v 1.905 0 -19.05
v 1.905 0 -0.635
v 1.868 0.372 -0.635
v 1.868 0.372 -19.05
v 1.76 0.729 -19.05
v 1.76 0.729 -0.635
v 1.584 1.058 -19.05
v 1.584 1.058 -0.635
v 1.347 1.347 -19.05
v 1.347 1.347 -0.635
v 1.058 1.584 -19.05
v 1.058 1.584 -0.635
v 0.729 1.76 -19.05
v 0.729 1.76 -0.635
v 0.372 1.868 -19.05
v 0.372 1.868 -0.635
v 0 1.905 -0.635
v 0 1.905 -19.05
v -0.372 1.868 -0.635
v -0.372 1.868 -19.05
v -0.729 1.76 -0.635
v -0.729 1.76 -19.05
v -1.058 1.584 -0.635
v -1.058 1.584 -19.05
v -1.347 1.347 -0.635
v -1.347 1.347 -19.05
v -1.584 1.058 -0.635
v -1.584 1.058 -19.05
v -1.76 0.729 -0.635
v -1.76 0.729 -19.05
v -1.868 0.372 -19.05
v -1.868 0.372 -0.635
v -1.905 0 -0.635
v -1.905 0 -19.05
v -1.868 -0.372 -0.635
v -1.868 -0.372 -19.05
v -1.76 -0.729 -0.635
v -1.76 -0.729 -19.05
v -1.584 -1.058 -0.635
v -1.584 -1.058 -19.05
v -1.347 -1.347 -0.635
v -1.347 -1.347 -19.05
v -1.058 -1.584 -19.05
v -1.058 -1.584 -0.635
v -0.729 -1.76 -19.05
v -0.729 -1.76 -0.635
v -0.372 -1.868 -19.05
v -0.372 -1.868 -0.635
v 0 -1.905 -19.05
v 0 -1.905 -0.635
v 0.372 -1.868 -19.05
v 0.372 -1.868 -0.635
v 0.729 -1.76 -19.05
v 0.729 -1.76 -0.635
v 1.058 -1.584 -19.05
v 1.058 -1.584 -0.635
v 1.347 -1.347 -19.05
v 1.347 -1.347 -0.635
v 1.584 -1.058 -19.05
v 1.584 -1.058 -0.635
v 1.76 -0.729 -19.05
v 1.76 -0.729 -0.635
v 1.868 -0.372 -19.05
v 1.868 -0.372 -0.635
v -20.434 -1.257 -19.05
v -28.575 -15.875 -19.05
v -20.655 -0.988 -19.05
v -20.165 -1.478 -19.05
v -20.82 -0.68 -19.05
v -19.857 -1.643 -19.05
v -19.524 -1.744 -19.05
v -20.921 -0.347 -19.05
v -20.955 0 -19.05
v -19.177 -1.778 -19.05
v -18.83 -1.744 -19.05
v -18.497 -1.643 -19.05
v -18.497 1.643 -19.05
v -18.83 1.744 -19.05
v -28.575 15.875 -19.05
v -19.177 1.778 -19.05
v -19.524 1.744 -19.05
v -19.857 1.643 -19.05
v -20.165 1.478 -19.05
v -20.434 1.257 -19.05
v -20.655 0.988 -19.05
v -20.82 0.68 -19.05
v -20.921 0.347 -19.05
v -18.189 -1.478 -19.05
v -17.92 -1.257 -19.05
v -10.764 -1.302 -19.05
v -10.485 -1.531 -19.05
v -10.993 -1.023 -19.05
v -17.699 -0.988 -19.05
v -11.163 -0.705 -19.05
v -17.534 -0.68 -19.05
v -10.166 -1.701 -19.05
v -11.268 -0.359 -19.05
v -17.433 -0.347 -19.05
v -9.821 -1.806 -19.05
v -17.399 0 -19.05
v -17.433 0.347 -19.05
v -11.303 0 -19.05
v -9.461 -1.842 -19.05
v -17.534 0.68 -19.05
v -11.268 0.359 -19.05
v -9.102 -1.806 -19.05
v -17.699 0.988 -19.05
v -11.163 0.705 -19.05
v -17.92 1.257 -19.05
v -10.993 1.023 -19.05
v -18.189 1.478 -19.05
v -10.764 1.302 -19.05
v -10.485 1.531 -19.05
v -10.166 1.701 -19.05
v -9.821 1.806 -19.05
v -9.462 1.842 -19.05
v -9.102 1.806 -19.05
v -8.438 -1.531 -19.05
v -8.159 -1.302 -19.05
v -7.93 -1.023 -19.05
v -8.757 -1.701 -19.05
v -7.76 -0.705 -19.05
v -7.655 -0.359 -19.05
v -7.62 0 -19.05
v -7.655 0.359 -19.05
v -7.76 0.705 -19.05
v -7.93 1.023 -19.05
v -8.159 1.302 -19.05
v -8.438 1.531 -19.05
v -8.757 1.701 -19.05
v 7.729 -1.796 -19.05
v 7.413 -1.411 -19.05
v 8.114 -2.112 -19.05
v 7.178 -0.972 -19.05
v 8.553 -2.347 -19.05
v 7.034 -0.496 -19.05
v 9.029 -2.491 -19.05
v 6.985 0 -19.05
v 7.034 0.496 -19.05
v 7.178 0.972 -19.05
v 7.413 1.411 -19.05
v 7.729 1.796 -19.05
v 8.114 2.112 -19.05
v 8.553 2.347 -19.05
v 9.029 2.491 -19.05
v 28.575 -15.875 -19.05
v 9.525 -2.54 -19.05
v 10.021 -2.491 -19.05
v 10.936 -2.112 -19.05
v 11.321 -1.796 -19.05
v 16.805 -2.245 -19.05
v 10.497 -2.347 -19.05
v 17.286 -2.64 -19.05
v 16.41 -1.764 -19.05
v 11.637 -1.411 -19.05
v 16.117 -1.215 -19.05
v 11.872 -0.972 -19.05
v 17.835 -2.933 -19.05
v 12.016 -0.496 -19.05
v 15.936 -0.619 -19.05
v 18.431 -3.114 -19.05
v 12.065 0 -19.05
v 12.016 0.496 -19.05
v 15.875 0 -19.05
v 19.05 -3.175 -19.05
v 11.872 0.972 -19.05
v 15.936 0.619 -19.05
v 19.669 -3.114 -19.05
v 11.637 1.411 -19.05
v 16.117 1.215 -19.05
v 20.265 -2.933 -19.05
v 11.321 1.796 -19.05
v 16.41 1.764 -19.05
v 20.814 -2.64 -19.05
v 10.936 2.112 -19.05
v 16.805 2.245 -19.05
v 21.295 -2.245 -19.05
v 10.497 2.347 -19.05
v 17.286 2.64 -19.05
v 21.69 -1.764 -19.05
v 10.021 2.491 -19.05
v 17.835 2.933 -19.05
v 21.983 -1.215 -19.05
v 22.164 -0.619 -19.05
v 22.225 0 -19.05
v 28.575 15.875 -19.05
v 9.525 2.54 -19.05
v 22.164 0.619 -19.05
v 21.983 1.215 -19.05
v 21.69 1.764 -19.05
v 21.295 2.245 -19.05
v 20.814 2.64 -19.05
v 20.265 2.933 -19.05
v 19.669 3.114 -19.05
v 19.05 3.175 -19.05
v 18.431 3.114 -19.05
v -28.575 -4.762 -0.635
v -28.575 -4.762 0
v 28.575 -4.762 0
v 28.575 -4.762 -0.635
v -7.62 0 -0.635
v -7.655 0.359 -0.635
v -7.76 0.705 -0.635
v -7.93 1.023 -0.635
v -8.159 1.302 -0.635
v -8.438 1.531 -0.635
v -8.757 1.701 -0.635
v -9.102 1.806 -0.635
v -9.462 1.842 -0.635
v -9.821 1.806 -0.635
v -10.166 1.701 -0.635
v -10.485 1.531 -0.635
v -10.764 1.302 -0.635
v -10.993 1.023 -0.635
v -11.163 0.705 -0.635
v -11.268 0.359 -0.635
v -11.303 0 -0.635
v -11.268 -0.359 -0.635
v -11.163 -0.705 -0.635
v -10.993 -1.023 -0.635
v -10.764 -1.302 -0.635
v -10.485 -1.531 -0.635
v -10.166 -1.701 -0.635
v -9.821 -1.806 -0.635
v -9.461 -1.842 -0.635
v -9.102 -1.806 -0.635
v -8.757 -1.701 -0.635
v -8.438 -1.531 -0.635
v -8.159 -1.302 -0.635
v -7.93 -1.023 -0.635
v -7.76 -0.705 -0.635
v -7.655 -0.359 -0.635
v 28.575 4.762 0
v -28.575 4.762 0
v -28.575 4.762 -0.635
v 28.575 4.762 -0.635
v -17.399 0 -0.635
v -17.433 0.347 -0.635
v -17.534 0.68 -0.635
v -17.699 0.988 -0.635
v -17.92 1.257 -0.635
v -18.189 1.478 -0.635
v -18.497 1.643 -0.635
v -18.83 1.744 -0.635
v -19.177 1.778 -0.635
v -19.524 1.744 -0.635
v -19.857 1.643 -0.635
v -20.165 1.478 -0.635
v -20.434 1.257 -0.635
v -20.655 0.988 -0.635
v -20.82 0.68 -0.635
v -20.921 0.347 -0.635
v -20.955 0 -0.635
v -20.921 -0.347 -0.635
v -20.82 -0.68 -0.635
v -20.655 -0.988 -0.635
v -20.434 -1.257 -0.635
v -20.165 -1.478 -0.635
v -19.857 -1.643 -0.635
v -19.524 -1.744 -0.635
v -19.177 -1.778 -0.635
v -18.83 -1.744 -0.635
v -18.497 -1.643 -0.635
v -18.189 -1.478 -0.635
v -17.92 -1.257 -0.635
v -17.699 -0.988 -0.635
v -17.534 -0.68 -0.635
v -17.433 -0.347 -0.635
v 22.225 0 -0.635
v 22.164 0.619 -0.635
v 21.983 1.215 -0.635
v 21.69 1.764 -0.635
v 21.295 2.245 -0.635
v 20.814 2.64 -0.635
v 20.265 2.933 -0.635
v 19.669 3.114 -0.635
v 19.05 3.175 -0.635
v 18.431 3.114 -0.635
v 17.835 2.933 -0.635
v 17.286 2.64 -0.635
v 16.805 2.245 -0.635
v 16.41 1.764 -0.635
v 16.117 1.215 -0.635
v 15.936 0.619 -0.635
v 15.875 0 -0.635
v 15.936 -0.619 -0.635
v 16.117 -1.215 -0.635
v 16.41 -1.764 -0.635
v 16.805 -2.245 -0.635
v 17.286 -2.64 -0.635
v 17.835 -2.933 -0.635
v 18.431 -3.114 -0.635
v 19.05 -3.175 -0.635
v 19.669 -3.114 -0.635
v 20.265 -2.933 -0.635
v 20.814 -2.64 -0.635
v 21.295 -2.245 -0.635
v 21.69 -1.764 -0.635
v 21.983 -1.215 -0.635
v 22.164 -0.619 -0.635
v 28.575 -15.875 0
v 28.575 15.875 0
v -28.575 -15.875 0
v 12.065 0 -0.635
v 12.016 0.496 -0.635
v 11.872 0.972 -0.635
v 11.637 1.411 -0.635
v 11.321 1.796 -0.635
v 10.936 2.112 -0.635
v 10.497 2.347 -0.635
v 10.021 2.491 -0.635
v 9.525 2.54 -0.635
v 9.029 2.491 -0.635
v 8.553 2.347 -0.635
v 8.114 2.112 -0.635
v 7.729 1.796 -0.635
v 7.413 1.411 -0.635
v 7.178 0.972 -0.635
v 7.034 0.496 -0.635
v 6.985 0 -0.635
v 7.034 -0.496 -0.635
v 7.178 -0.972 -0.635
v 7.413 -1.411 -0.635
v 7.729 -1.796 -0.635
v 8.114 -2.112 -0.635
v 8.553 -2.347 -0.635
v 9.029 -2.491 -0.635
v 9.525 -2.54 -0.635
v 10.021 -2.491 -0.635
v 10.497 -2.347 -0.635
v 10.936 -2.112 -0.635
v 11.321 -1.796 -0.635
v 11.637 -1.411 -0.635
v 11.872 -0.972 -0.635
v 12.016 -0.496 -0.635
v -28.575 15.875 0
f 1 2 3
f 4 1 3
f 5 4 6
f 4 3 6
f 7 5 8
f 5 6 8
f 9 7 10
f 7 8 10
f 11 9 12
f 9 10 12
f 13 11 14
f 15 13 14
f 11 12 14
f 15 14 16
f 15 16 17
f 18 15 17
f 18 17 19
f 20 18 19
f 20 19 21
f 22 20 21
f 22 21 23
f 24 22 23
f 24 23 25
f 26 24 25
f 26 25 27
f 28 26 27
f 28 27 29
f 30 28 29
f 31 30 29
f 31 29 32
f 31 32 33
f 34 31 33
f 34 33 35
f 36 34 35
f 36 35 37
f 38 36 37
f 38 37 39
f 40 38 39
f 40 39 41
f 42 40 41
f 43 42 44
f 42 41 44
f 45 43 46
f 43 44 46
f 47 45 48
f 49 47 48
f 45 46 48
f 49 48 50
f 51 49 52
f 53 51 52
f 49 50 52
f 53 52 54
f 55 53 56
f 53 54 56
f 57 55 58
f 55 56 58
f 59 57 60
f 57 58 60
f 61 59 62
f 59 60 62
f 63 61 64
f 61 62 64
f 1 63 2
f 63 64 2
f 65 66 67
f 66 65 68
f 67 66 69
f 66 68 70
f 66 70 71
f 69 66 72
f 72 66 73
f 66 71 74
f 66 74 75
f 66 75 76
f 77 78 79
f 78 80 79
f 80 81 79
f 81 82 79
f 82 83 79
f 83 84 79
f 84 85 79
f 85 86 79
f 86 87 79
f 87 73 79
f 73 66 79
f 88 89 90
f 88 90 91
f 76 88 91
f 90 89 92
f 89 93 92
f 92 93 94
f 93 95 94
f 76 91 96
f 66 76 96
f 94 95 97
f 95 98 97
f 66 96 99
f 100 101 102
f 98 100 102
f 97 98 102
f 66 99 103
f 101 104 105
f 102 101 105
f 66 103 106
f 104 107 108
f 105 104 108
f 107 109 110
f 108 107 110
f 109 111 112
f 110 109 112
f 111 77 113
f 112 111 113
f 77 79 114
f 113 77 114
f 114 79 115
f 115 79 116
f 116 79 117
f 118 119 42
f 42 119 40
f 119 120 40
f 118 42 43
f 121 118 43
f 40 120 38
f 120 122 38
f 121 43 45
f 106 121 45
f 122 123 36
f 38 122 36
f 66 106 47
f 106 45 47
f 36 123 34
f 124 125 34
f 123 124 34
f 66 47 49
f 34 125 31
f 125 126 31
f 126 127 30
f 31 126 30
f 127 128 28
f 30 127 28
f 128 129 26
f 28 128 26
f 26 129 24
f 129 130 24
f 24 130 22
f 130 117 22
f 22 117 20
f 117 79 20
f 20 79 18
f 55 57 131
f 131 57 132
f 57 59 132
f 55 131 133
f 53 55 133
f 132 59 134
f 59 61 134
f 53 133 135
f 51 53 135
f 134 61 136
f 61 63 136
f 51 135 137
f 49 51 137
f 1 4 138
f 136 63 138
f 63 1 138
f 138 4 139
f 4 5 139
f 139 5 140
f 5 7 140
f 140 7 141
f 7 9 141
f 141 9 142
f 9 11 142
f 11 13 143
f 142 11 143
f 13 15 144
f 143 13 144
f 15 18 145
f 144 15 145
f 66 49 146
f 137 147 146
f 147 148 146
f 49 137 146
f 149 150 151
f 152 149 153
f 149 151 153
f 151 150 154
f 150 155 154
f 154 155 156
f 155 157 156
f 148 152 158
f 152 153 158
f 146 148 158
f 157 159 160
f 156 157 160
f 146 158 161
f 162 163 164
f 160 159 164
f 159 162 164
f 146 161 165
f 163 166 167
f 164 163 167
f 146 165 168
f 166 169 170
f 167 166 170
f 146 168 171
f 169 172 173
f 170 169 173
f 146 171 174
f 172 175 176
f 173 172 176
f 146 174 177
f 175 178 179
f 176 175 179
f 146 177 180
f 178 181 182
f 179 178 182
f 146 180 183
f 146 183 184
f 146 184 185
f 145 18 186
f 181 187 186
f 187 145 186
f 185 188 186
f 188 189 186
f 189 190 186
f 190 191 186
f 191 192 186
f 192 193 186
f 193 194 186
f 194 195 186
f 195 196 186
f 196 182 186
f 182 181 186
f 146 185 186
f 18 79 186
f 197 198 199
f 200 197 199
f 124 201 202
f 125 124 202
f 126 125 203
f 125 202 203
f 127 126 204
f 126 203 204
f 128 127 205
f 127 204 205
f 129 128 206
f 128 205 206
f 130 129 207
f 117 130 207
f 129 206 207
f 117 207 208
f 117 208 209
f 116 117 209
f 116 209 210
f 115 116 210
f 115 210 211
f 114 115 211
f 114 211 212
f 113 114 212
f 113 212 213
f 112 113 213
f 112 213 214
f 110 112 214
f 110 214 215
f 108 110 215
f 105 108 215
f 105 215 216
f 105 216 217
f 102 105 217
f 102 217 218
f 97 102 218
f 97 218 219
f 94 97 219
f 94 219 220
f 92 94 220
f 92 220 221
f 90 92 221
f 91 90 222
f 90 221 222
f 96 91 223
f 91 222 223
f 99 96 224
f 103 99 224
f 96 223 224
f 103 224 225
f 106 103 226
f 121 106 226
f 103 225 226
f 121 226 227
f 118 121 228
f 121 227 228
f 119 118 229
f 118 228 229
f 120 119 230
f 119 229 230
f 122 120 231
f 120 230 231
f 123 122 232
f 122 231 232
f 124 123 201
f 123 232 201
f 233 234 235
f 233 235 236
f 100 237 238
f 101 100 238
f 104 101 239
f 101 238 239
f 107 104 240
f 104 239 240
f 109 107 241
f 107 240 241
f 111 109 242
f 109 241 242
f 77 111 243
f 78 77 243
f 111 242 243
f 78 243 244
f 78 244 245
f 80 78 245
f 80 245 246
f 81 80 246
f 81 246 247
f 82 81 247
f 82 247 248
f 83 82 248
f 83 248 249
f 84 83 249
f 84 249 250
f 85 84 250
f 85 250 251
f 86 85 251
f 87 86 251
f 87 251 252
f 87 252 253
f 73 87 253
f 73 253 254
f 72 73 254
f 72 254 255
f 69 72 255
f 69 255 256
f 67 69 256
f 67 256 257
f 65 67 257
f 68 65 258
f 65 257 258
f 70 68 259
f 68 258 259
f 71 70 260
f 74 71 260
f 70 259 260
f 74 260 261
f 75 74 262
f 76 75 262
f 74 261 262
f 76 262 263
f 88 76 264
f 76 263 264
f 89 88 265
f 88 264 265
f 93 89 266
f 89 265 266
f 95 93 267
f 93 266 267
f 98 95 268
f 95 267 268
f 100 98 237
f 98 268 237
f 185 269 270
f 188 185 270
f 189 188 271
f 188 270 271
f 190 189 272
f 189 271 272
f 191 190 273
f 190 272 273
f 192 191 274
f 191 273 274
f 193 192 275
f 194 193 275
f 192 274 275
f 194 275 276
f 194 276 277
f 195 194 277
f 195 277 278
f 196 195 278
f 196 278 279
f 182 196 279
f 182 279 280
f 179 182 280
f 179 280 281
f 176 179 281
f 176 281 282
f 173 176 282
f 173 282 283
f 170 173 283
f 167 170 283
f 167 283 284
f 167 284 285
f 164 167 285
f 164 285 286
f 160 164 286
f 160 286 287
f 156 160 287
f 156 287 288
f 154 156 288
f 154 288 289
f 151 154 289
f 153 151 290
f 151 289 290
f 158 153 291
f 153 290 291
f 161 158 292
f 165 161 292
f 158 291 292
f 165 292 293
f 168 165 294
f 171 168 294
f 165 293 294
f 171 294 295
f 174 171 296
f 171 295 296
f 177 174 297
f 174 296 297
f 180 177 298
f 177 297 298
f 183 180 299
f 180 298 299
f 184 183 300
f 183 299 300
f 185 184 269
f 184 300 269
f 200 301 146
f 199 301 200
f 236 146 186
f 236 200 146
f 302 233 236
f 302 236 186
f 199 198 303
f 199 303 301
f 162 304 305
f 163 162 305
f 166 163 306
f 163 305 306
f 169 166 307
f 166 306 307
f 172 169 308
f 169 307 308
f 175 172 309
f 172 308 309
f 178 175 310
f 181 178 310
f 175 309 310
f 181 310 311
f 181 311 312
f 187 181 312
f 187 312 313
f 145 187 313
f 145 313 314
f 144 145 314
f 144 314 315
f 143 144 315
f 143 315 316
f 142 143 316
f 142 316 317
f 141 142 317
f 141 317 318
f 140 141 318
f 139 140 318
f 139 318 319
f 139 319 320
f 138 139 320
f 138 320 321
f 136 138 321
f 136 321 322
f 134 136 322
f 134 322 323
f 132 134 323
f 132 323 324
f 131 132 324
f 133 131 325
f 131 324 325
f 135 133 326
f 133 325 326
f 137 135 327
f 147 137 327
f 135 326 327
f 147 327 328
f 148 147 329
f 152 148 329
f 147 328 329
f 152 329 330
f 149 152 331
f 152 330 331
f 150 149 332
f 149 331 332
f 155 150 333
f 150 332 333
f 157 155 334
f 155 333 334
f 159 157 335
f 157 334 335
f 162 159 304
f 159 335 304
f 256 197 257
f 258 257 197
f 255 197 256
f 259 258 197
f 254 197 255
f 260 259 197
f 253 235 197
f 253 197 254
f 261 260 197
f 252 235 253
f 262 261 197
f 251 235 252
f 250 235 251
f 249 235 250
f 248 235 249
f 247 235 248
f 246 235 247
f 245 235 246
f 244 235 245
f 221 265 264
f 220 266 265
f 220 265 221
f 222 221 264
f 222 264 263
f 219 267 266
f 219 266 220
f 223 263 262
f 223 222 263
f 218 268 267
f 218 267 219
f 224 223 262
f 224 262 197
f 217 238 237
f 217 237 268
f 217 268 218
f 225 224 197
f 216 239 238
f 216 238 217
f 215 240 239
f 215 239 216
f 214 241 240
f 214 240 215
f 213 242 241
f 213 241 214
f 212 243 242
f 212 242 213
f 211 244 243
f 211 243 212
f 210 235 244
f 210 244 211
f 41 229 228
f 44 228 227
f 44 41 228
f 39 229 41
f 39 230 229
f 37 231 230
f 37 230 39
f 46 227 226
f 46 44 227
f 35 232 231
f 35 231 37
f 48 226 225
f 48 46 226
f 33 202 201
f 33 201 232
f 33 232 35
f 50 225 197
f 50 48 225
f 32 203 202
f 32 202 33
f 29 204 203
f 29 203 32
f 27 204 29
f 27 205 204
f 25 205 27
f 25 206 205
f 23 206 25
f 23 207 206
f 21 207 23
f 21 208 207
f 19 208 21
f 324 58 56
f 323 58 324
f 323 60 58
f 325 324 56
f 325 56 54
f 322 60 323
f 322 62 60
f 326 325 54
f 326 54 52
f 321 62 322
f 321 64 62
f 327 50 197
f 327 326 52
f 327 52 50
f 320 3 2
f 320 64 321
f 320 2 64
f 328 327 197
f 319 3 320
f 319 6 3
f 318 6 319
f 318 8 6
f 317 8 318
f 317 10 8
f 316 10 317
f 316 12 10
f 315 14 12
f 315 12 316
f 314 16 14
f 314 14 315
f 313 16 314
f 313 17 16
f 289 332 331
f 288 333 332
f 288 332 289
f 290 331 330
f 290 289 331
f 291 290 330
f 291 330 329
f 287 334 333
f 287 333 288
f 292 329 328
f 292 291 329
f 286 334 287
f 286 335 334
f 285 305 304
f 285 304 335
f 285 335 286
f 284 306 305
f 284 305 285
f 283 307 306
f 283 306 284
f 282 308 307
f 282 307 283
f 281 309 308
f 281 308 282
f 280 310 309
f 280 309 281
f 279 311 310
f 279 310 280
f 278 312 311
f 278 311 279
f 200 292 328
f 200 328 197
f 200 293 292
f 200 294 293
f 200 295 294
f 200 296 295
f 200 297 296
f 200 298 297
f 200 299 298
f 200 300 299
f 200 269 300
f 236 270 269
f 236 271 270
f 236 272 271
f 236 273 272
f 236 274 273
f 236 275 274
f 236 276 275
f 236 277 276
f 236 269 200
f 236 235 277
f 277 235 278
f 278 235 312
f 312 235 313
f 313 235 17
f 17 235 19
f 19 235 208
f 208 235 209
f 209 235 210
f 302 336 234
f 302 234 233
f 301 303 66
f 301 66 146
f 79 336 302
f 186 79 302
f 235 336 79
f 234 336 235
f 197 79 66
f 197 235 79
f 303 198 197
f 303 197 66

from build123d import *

# Parameters (mm, degrees)
F0_W     = 57.15
F0_H     = 11.1125
F0_H_2   = 9.525
F0_R     = 1.778
F0_R_2   = 1.8415
F0_R_3   = 1.905
F0_R_4   = 2.54
F0_R_5   = 3.175
F1_DEPTH = 19.05
F2_DEPTH = 0.635


with BuildPart() as f1:
    # F0 (on Top) → F1 (new body)
    with BuildSketch(Plane.XY):
        with Locations((0, 10.31875)):
            Rectangle(F0_W, F0_H)
        Rectangle(F0_W, F0_H_2)
        with Locations((-19.177, 0)):
            Circle(F0_R, mode=Mode.SUBTRACT)
        with Locations((-9.4615, 0)):
            Circle(F0_R_2, mode=Mode.SUBTRACT)
        Circle(F0_R_3, mode=Mode.SUBTRACT)
        with Locations((9.525, 0)):
            Circle(F0_R_4, mode=Mode.SUBTRACT)
        with Locations((19.05, 0)):
            Circle(F0_R_5, mode=Mode.SUBTRACT)
        with Locations((0, -10.31875)):
            Rectangle(F0_W, F0_H)
    extrude(amount=-F1_DEPTH)

    # F0 (on Top) → F2 (cut)
    with BuildSketch(Plane.XY):
        Rectangle(F0_W, F0_H_2)
        with Locations((-19.177, 0)):
            Circle(F0_R, mode=Mode.SUBTRACT)
        with Locations((-9.4615, 0)):
            Circle(F0_R_2, mode=Mode.SUBTRACT)
        Circle(F0_R_3, mode=Mode.SUBTRACT)
        with Locations((9.525, 0)):
            Circle(F0_R_4, mode=Mode.SUBTRACT)
        with Locations((19.05, 0)):
            Circle(F0_R_5, mode=Mode.SUBTRACT)
    extrude(amount=-F2_DEPTH, mode=Mode.SUBTRACT)


solid = f1.part
